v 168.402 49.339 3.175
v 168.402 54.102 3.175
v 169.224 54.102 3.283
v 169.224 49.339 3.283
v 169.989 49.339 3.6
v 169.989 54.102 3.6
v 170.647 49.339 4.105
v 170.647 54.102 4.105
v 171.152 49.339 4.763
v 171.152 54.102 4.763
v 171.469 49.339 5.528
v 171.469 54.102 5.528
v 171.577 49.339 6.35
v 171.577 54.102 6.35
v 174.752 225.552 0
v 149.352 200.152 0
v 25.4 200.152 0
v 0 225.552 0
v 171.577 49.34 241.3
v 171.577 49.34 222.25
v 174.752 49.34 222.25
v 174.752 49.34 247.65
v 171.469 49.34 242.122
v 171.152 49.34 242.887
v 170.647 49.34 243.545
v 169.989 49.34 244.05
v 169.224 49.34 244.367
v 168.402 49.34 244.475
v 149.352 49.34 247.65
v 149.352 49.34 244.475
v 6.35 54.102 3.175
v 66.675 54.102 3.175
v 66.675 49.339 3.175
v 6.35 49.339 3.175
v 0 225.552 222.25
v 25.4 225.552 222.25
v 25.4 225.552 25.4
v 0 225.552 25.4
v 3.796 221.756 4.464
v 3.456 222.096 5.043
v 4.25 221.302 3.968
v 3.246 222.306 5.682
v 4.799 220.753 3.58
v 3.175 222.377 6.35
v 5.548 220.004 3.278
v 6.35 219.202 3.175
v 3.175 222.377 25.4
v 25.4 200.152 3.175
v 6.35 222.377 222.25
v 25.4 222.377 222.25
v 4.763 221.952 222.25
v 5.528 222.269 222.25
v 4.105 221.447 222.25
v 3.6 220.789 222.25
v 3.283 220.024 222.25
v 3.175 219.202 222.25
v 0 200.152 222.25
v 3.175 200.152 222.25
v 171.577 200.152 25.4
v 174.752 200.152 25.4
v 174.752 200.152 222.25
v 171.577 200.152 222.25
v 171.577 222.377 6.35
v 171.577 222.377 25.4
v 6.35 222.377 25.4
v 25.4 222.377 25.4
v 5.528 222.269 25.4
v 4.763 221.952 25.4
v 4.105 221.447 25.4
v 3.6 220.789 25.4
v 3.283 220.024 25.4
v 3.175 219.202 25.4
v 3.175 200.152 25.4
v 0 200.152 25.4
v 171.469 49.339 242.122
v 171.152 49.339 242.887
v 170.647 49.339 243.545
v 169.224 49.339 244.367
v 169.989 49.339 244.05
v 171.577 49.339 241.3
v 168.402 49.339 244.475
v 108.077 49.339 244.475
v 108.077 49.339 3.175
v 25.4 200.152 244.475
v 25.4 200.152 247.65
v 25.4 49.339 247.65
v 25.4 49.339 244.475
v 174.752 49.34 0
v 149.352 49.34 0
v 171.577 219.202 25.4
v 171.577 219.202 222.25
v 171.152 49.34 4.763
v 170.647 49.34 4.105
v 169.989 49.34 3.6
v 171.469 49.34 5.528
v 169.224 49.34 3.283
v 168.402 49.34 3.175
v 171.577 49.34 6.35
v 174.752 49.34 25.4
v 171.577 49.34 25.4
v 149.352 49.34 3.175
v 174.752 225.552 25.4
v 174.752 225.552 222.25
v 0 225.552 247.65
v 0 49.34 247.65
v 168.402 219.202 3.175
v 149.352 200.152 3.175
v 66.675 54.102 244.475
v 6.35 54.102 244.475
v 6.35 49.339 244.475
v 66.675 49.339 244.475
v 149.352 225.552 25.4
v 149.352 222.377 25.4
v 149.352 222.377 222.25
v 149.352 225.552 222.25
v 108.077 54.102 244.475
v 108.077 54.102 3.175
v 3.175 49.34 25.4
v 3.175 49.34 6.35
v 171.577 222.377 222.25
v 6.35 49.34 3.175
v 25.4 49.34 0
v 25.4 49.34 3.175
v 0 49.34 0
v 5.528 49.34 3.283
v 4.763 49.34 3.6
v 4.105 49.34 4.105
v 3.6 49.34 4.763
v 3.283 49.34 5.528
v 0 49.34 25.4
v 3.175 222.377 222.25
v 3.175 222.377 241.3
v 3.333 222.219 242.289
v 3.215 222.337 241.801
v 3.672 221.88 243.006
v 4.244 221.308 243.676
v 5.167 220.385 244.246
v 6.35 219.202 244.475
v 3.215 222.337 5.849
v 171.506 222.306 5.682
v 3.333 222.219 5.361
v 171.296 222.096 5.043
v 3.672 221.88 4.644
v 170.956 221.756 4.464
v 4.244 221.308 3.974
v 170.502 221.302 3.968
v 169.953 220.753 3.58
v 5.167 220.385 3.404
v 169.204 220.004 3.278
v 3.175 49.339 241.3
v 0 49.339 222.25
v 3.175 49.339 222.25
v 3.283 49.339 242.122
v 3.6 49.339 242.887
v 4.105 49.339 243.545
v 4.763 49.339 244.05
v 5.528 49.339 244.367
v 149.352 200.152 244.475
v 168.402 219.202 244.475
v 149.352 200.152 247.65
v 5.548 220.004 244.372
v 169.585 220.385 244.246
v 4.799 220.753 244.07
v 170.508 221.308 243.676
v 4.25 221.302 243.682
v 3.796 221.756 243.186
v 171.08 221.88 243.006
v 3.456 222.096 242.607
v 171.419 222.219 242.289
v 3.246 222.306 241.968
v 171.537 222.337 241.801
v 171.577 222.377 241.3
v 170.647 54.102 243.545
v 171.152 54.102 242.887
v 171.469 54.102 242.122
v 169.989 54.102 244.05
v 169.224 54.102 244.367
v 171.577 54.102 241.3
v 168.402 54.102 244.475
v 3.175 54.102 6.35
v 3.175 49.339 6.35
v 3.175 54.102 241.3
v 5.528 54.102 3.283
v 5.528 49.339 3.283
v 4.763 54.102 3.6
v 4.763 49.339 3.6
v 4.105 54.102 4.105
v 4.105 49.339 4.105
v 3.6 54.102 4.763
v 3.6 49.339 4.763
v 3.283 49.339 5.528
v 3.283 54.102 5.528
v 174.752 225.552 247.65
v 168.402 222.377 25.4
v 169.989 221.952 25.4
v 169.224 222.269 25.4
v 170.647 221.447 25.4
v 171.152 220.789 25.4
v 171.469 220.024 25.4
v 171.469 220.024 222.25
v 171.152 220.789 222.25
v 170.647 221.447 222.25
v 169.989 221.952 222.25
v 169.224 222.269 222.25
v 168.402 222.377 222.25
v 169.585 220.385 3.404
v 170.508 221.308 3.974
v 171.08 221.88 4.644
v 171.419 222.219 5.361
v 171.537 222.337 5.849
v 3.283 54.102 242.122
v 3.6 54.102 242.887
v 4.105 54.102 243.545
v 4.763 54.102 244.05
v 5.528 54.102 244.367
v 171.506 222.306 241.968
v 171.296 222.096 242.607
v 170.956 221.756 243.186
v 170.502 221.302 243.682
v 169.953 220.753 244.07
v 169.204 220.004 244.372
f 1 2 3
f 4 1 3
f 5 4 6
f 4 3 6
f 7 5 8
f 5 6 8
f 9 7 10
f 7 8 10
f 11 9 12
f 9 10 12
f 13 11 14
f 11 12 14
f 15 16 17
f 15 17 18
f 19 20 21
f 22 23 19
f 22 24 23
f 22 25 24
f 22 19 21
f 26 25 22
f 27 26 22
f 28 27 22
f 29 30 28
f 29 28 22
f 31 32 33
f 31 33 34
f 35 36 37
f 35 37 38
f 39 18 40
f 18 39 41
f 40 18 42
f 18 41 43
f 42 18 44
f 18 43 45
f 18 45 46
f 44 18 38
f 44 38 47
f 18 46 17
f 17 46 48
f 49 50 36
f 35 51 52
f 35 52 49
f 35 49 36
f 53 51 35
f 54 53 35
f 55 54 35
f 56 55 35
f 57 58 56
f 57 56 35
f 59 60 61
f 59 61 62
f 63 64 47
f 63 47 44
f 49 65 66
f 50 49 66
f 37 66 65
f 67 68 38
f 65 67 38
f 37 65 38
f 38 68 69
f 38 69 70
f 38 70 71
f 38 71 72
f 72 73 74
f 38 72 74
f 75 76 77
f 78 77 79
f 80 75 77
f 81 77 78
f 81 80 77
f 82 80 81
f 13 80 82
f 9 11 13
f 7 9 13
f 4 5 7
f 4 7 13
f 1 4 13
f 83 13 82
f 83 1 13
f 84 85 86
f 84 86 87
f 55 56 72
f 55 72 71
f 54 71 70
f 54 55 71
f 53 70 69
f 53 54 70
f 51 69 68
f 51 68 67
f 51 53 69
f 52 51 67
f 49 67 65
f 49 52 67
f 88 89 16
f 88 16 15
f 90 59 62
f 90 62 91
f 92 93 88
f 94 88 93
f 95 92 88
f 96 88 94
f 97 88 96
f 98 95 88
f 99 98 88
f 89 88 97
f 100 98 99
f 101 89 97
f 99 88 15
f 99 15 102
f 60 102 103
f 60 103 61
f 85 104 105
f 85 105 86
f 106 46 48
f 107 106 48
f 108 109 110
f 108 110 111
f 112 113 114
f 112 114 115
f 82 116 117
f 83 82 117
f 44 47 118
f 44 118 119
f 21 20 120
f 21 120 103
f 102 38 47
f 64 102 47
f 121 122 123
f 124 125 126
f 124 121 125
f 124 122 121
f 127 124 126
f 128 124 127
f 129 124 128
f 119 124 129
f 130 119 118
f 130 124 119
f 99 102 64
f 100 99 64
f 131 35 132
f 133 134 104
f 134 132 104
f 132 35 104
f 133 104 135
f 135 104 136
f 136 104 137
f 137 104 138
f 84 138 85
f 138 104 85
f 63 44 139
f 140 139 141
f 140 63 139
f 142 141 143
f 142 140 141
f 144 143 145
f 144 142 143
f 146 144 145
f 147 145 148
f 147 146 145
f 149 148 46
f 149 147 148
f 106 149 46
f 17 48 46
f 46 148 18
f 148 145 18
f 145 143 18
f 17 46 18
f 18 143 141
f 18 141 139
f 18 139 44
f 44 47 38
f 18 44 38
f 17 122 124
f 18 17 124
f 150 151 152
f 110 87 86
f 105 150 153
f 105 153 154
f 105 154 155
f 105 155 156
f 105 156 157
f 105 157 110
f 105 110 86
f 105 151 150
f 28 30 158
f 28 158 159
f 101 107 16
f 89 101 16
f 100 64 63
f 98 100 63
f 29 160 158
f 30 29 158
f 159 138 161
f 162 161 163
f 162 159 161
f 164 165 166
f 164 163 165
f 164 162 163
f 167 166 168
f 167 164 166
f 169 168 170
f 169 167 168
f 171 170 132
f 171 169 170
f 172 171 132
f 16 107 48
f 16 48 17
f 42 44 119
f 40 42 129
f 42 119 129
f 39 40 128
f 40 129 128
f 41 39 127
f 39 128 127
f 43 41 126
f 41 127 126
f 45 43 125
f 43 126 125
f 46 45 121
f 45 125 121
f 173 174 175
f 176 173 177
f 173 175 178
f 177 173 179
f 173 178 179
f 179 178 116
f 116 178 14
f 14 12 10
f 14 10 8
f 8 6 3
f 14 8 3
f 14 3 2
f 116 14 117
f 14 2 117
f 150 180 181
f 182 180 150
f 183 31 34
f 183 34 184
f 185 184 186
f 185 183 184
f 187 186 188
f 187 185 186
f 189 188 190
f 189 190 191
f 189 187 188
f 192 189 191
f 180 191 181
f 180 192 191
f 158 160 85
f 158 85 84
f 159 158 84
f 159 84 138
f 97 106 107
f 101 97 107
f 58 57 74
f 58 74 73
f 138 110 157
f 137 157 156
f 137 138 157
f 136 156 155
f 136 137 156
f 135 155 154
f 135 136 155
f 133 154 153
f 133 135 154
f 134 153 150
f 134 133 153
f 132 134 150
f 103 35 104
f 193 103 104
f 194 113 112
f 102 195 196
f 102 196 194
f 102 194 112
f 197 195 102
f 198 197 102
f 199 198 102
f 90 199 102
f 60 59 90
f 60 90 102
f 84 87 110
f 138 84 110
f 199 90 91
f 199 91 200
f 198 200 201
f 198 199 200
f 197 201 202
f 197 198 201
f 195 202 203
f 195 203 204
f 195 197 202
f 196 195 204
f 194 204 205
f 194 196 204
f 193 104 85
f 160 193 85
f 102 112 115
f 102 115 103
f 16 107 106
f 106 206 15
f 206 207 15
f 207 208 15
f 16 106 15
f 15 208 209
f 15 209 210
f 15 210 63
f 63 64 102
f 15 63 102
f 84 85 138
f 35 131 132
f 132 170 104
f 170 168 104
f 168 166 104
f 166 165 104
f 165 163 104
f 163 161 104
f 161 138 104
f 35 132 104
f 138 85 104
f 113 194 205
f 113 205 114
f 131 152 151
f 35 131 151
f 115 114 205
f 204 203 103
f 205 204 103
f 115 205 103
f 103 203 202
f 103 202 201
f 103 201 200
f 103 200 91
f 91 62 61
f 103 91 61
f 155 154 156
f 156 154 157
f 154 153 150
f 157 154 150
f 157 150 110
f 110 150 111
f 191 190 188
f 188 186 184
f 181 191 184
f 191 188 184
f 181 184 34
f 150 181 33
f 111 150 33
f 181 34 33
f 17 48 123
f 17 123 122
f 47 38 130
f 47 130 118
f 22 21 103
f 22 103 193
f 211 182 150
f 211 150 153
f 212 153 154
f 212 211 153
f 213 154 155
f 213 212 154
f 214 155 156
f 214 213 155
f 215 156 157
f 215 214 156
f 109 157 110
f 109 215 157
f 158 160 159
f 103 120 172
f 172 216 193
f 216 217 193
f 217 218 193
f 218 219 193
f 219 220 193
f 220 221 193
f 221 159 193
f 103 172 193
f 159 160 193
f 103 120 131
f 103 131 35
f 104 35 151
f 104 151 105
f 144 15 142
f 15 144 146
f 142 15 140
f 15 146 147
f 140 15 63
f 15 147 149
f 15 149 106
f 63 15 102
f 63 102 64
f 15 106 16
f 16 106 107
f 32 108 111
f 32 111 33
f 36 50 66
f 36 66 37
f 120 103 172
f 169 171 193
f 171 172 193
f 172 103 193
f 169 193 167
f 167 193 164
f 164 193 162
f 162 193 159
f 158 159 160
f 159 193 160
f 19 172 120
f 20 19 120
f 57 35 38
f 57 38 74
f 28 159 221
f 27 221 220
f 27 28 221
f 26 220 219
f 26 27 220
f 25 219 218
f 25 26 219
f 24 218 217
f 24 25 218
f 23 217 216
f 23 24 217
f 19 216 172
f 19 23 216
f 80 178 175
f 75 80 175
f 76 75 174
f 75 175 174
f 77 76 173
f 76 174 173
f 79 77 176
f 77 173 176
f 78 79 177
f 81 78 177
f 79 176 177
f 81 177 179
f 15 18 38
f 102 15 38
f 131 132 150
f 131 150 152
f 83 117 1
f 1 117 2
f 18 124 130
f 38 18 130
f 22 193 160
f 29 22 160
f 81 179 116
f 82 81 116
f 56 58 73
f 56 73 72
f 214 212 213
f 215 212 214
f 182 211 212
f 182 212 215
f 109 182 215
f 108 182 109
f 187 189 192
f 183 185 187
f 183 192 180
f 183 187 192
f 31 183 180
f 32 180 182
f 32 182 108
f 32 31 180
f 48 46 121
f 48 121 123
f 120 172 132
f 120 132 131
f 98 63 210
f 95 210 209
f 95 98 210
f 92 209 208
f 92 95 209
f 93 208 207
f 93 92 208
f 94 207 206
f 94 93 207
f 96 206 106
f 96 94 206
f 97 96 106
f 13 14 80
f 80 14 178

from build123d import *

# Parameters (mm, degrees)
NGULO_DE_EXTREMOS_CUADRADOS_AL_LS_AL_LS_DEPTH       = 262.473024484
NGULO_DE_EXTREMOS_CUADRADOS_AL_LS_AL_3_DEPTH        = 248.594048969
NGULO_DE_EXTREMOS_CUADRADOS_AL_LS_AL_5_DEPTH        = 262.473024484
NGULO_DE_EXTREMOS_CUADRADOS_AL_LS_AL_6_DEPTH        = 262.473024484
NGULO_DE_EXTREMOS_CUADRADOS_AL_LS_AL_6_2_DEPTH      = 248.594048969
NGULO_DE_EXTREMOS_CUADRADOS_AL_LS_AL_6_3_DEPTH      = 36.921024484
NGULO_DE_EXTREMOS_CUADRADOS_AL_LS_AL_6_3_DEPTH_BACK = 225.552
NGULO_DE_EXTREMOS_CUADRADOS_AL_LS_AL_10_DEPTH       = 196.85
NGULO_DE_EXTREMOS_CUADRADOS_AL_LS_AL_11_DEPTH       = 196.85
SALIENTE_EXTRUIR1_DEPTH                             = 4.7625
SALIENTE_EXTRUIR1_2_DEPTH                           = 4.7625
CROQUIS4_W                                          = 247.65
CROQUIS4_H                                          = 49.3395
CORTAR_EXTRUIR1_DEPTH                               = 378.812769382


with BuildPart() as part:
    # Sketch1 → ngulo de extremos cuadrados al ls AL LS (new body)
    with BuildSketch(Plane.XZ):
        with BuildLine():
            Line((0, 0), (0, 25.4))
            Line((0, 25.4), (3.175, 25.4))
            Line((3.175, 25.4), (3.175, 6.35))
            ThreePointArc((3.175, 6.35), (4.10493597, 4.10493597), (6.35, 3.175))
            Line((6.35, 3.175), (25.4, 3.175))
            Line((25.4, 3.175), (25.4, 0))
            Line((25.4, 0), (0, 0))
        make_face()
    extrude(amount=-NGULO_DE_EXTREMOS_CUADRADOS_AL_LS_AL_LS_DEPTH)

    # ngulo de extremos cuadrados al ls AL 2
    split(bisect_by=Plane(origin=(0, 225.552, 0), x_dir=(0.707106781, -0.707106781, 0), z_dir=(-0.707106781, -0.707106781, 0)), keep=Keep.TOP)


with BuildPart() as body_2:
    # Sketch1 on segment 2 (carried to segment 2) → ngulo de extremos cuadrados al ls AL 3 (new body)
    with BuildSketch(Plane(origin=(211.673024484, 225.552, 0), x_dir=(0, -1, 0), z_dir=(-1, 0, 0))):
        with BuildLine():
            Line((0, 0), (0, 25.4))
            Line((0, 25.4), (3.175, 25.4))
            Line((3.175, 25.4), (3.175, 6.35))
            ThreePointArc((3.175, 6.35), (4.10493597, 4.10493597), (6.35, 3.175))
            Line((6.35, 3.175), (25.4, 3.175))
            Line((25.4, 3.175), (25.4, 0))
            Line((25.4, 0), (0, 0))
        make_face()
    extrude(amount=NGULO_DE_EXTREMOS_CUADRADOS_AL_LS_AL_3_DEPTH)

    # ngulo de extremos cuadrados al ls AL 3 m
    split(bisect_by=Plane(origin=(0, 225.552, 0), x_dir=(-0.707106781, 0.707106781, 0), z_dir=(0.707106781, 0.707106781, 0)), keep=Keep.TOP)

    # ngulo de extremos cuadrados al ls AL 4
    split(bisect_by=Plane(origin=(174.752, 225.552, 0), x_dir=(-0.707106781, -0.707106781, 0), z_dir=(-0.707106781, 0.707106781, 0)), keep=Keep.TOP)


with BuildPart() as body_3:
    # Sketch1 on segment 3 (carried to segment 3) → ngulo de extremos cuadrados al ls AL 5 (new body)
    with BuildSketch(Plane(origin=(174.752, 0, 0), x_dir=(-1, 0, 0), z_dir=(0, 1, 0))):
        with BuildLine():
            Line((0, 0), (0, 25.4))
            Line((0, 25.4), (3.175, 25.4))
            Line((3.175, 25.4), (3.175, 6.35))
            ThreePointArc((3.175, 6.35), (4.10493597, 4.10493597), (6.35, 3.175))
            Line((6.35, 3.175), (25.4, 3.175))
            Line((25.4, 3.175), (25.4, 0))
            Line((25.4, 0), (0, 0))
        make_face()
    extrude(amount=NGULO_DE_EXTREMOS_CUADRADOS_AL_LS_AL_5_DEPTH)

    # ngulo de extremos cuadrados al ls AL 5 m
    split(bisect_by=Plane(origin=(174.752, 225.552, 0), x_dir=(0.707106781, 0.707106781, 0), z_dir=(0.707106781, -0.707106781, 0)), keep=Keep.TOP)


with BuildPart() as body_4:
    # Sketch12 on segment 1 (carried to segment 1) → ngulo de extremos cuadrados al ls AL 6 (new body)
    with BuildSketch(Plane(origin=(0, 262.473024484, 247.65), x_dir=(0, 0, -1), z_dir=(0, -1, 0))):
        with BuildLine():
            Line((0, 0), (0, 25.4))
            Line((0, 25.4), (3.175, 25.4))
            Line((3.175, 25.4), (3.175, 6.35))
            ThreePointArc((3.175, 6.35), (4.10493597, 4.10493597), (6.35, 3.175))
            Line((6.35, 3.175), (25.4, 3.175))
            Line((25.4, 3.175), (25.4, 0))
            Line((25.4, 0), (0, 0))
        make_face()
    extrude(amount=NGULO_DE_EXTREMOS_CUADRADOS_AL_LS_AL_6_DEPTH)

    # ngulo de extremos cuadrados al ls AL 6 m
    split(bisect_by=Plane(origin=(0, 225.552, 247.65), x_dir=(0.707106781, -0.707106781, 0), z_dir=(-0.707106781, -0.707106781, 0)), keep=Keep.TOP)


with BuildPart() as body_5:
    # Sketch12 on segment 2 (carried to segment 2) → ngulo de extremos cuadrados al ls AL 6 2 (new body)
    with BuildSketch(Plane(origin=(211.673024484, 225.552, 247.65), x_dir=(0, 0, -1), z_dir=(-1, 0, 0))):
        with BuildLine():
            Line((0, 0), (0, 25.4))
            Line((0, 25.4), (3.175, 25.4))
            Line((3.175, 25.4), (3.175, 6.35))
            ThreePointArc((3.175, 6.35), (4.10493597, 4.10493597), (6.35, 3.175))
            Line((6.35, 3.175), (25.4, 3.175))
            Line((25.4, 3.175), (25.4, 0))
            Line((25.4, 0), (0, 0))
        make_face()
    extrude(amount=NGULO_DE_EXTREMOS_CUADRADOS_AL_LS_AL_6_2_DEPTH)

    # ngulo de extremos cuadrados al ls AL 7
    split(bisect_by=Plane(origin=(0, 225.552, 247.65), x_dir=(-0.707106781, 0.707106781, 0), z_dir=(0.707106781, 0.707106781, 0)), keep=Keep.TOP)

    # ngulo de extremos cuadrados al ls AL 8
    split(bisect_by=Plane(origin=(174.752, 225.552, 247.65), x_dir=(-0.707106781, -0.707106781, 0), z_dir=(-0.707106781, 0.707106781, 0)), keep=Keep.TOP)


with BuildPart() as body_6:
    # Sketch12 → ngulo de extremos cuadrados al ls AL 6 3 (new, two sides: drawn at the far end of the back side and taken through both)
    with BuildSketch(Plane(origin=(174.752, 225.552, 247.65), x_dir=(0, 0, -1), z_dir=(0, 1, 0)).offset(-NGULO_DE_EXTREMOS_CUADRADOS_AL_LS_AL_6_3_DEPTH_BACK)):
        with BuildLine():
            Line((0, 0), (0, 25.4))
            Line((0, 25.4), (3.175, 25.4))
            Line((3.175, 25.4), (3.175, 6.35))
            ThreePointArc((3.175, 6.35), (4.10493597, 4.10493597), (6.35, 3.175))
            Line((6.35, 3.175), (25.4, 3.175))
            Line((25.4, 3.175), (25.4, 0))
            Line((25.4, 0), (0, 0))
        make_face()
    extrude(amount=NGULO_DE_EXTREMOS_CUADRADOS_AL_LS_AL_6_3_DEPTH + NGULO_DE_EXTREMOS_CUADRADOS_AL_LS_AL_6_3_DEPTH_BACK)

    # ngulo de extremos cuadrados al ls AL 9
    split(bisect_by=Plane(origin=(174.752, 225.552, 247.65), x_dir=(0.707106781, 0.707106781, 0), z_dir=(0.707106781, -0.707106781, 0)), keep=Keep.TOP)


with BuildPart() as body_7:
    # Sketch13 → ngulo de extremos cuadrados al ls AL 10 (new body)
    with BuildSketch(Plane(origin=(174.752, 225.552, 25.4), x_dir=(-1, 0, 0), z_dir=(0, 0, 1))):
        with BuildLine():
            Line((0, 0), (0, 25.4))
            Line((0, 25.4), (3.175, 25.4))
            Line((3.175, 25.4), (3.175, 6.35))
            ThreePointArc((3.175, 6.35), (4.10493597, 4.10493597), (6.35, 3.175))
            Line((6.35, 3.175), (25.4, 3.175))
            Line((25.4, 3.175), (25.4, 0))
            Line((25.4, 0), (0, 0))
        make_face()
    extrude(amount=NGULO_DE_EXTREMOS_CUADRADOS_AL_LS_AL_10_DEPTH)


with BuildPart() as body_8:
    # Sketch14 → ngulo de extremos cuadrados al ls AL 11 (new body)
    with BuildSketch(Plane(origin=(0, 225.552, 222.25), x_dir=(1, 0, 0), z_dir=(0, 0, -1))):
        with BuildLine():
            Line((0, 0), (0, 25.4))
            Line((0, 25.4), (3.175, 25.4))
            Line((3.175, 25.4), (3.175, 6.35))
            ThreePointArc((3.175, 6.35), (4.10493597, 4.10493597), (6.35, 3.175))
            Line((6.35, 3.175), (25.4, 3.175))
            Line((25.4, 3.175), (25.4, 0))
            Line((25.4, 0), (0, 0))
        make_face()
    extrude(amount=NGULO_DE_EXTREMOS_CUADRADOS_AL_LS_AL_11_DEPTH)


with BuildPart() as body_9:
    # Croquis3 → Saliente-Extruir1 (new body)
    with BuildSketch(Plane(origin=(0, 54.102, 0), x_dir=(-1, 0, 0), z_dir=(0, -1, 0))):
        with BuildLine():
            Line((-168.402, -244.475), (-108.077, -244.475))
            Line((-108.077, -244.475), (-108.077, -3.175))
            Line((-108.077, -3.175), (-168.402, -3.175))
            ThreePointArc((-168.402, -3.175), (-170.64706403, -4.10493597), (-171.577, -6.35))
            Line((-171.577, -6.35), (-171.577, -241.3))
            ThreePointArc((-171.577, -241.3), (-170.64706403, -243.54506403), (-168.402, -244.475))
        make_face()
    extrude(amount=SALIENTE_EXTRUIR1_DEPTH)


with BuildPart() as body_10:
    # Croquis3 → Saliente-Extruir1 2 (new body)
    with BuildSketch(Plane(origin=(0, 54.102, 0), x_dir=(-1, 0, 0), z_dir=(0, -1, 0))):
        with BuildLine():
            Line((-66.675, -3.175), (-6.35, -3.175))
            ThreePointArc((-6.35, -3.175), (-4.10493597, -4.10493597), (-3.175, -6.35))
            Line((-3.175, -6.35), (-3.175, -241.3))
            ThreePointArc((-3.175, -241.3), (-4.10493597, -243.54506403), (-6.35, -244.475))
            Line((-6.35, -244.475), (-66.675, -244.475))
            Line((-66.675, -244.475), (-66.675, -3.175))
        make_face()
    extrude(amount=SALIENTE_EXTRUIR1_2_DEPTH)


with BuildPart() as cortar_extruir1_tool:
    # Croquis4 → Cortar-Extruir1 (new, through all)
    with BuildSketch(Plane.ZY):
        with Locations((123.825, 24.66975)):
            Rectangle(CROQUIS4_W, CROQUIS4_H)
    extrude(amount=-CORTAR_EXTRUIR1_DEPTH)


with BuildPart() as part_1:
    add(part.part)

    # Cortar-Extruir1: cut by cortar_extruir1_tool
    add(cortar_extruir1_tool.part, mode=Mode.SUBTRACT)


with BuildPart() as body_3_1:
    add(body_3.part)

    # Cortar-Extruir1: cut by cortar_extruir1_tool
    add(cortar_extruir1_tool.part, mode=Mode.SUBTRACT)


with BuildPart() as body_4_1:
    add(body_4.part)

    # Cortar-Extruir1: cut by cortar_extruir1_tool
    add(cortar_extruir1_tool.part, mode=Mode.SUBTRACT)


with BuildPart() as body_6_1:
    add(body_6.part)

    # Cortar-Extruir1: cut by cortar_extruir1_tool
    add(cortar_extruir1_tool.part, mode=Mode.SUBTRACT)


solid = Compound([body_2.part, body_5.part, body_7.part, body_8.part, body_9.part, body_10.part, part_1.part, body_3_1.part, body_4_1.part, body_6_1.part])
